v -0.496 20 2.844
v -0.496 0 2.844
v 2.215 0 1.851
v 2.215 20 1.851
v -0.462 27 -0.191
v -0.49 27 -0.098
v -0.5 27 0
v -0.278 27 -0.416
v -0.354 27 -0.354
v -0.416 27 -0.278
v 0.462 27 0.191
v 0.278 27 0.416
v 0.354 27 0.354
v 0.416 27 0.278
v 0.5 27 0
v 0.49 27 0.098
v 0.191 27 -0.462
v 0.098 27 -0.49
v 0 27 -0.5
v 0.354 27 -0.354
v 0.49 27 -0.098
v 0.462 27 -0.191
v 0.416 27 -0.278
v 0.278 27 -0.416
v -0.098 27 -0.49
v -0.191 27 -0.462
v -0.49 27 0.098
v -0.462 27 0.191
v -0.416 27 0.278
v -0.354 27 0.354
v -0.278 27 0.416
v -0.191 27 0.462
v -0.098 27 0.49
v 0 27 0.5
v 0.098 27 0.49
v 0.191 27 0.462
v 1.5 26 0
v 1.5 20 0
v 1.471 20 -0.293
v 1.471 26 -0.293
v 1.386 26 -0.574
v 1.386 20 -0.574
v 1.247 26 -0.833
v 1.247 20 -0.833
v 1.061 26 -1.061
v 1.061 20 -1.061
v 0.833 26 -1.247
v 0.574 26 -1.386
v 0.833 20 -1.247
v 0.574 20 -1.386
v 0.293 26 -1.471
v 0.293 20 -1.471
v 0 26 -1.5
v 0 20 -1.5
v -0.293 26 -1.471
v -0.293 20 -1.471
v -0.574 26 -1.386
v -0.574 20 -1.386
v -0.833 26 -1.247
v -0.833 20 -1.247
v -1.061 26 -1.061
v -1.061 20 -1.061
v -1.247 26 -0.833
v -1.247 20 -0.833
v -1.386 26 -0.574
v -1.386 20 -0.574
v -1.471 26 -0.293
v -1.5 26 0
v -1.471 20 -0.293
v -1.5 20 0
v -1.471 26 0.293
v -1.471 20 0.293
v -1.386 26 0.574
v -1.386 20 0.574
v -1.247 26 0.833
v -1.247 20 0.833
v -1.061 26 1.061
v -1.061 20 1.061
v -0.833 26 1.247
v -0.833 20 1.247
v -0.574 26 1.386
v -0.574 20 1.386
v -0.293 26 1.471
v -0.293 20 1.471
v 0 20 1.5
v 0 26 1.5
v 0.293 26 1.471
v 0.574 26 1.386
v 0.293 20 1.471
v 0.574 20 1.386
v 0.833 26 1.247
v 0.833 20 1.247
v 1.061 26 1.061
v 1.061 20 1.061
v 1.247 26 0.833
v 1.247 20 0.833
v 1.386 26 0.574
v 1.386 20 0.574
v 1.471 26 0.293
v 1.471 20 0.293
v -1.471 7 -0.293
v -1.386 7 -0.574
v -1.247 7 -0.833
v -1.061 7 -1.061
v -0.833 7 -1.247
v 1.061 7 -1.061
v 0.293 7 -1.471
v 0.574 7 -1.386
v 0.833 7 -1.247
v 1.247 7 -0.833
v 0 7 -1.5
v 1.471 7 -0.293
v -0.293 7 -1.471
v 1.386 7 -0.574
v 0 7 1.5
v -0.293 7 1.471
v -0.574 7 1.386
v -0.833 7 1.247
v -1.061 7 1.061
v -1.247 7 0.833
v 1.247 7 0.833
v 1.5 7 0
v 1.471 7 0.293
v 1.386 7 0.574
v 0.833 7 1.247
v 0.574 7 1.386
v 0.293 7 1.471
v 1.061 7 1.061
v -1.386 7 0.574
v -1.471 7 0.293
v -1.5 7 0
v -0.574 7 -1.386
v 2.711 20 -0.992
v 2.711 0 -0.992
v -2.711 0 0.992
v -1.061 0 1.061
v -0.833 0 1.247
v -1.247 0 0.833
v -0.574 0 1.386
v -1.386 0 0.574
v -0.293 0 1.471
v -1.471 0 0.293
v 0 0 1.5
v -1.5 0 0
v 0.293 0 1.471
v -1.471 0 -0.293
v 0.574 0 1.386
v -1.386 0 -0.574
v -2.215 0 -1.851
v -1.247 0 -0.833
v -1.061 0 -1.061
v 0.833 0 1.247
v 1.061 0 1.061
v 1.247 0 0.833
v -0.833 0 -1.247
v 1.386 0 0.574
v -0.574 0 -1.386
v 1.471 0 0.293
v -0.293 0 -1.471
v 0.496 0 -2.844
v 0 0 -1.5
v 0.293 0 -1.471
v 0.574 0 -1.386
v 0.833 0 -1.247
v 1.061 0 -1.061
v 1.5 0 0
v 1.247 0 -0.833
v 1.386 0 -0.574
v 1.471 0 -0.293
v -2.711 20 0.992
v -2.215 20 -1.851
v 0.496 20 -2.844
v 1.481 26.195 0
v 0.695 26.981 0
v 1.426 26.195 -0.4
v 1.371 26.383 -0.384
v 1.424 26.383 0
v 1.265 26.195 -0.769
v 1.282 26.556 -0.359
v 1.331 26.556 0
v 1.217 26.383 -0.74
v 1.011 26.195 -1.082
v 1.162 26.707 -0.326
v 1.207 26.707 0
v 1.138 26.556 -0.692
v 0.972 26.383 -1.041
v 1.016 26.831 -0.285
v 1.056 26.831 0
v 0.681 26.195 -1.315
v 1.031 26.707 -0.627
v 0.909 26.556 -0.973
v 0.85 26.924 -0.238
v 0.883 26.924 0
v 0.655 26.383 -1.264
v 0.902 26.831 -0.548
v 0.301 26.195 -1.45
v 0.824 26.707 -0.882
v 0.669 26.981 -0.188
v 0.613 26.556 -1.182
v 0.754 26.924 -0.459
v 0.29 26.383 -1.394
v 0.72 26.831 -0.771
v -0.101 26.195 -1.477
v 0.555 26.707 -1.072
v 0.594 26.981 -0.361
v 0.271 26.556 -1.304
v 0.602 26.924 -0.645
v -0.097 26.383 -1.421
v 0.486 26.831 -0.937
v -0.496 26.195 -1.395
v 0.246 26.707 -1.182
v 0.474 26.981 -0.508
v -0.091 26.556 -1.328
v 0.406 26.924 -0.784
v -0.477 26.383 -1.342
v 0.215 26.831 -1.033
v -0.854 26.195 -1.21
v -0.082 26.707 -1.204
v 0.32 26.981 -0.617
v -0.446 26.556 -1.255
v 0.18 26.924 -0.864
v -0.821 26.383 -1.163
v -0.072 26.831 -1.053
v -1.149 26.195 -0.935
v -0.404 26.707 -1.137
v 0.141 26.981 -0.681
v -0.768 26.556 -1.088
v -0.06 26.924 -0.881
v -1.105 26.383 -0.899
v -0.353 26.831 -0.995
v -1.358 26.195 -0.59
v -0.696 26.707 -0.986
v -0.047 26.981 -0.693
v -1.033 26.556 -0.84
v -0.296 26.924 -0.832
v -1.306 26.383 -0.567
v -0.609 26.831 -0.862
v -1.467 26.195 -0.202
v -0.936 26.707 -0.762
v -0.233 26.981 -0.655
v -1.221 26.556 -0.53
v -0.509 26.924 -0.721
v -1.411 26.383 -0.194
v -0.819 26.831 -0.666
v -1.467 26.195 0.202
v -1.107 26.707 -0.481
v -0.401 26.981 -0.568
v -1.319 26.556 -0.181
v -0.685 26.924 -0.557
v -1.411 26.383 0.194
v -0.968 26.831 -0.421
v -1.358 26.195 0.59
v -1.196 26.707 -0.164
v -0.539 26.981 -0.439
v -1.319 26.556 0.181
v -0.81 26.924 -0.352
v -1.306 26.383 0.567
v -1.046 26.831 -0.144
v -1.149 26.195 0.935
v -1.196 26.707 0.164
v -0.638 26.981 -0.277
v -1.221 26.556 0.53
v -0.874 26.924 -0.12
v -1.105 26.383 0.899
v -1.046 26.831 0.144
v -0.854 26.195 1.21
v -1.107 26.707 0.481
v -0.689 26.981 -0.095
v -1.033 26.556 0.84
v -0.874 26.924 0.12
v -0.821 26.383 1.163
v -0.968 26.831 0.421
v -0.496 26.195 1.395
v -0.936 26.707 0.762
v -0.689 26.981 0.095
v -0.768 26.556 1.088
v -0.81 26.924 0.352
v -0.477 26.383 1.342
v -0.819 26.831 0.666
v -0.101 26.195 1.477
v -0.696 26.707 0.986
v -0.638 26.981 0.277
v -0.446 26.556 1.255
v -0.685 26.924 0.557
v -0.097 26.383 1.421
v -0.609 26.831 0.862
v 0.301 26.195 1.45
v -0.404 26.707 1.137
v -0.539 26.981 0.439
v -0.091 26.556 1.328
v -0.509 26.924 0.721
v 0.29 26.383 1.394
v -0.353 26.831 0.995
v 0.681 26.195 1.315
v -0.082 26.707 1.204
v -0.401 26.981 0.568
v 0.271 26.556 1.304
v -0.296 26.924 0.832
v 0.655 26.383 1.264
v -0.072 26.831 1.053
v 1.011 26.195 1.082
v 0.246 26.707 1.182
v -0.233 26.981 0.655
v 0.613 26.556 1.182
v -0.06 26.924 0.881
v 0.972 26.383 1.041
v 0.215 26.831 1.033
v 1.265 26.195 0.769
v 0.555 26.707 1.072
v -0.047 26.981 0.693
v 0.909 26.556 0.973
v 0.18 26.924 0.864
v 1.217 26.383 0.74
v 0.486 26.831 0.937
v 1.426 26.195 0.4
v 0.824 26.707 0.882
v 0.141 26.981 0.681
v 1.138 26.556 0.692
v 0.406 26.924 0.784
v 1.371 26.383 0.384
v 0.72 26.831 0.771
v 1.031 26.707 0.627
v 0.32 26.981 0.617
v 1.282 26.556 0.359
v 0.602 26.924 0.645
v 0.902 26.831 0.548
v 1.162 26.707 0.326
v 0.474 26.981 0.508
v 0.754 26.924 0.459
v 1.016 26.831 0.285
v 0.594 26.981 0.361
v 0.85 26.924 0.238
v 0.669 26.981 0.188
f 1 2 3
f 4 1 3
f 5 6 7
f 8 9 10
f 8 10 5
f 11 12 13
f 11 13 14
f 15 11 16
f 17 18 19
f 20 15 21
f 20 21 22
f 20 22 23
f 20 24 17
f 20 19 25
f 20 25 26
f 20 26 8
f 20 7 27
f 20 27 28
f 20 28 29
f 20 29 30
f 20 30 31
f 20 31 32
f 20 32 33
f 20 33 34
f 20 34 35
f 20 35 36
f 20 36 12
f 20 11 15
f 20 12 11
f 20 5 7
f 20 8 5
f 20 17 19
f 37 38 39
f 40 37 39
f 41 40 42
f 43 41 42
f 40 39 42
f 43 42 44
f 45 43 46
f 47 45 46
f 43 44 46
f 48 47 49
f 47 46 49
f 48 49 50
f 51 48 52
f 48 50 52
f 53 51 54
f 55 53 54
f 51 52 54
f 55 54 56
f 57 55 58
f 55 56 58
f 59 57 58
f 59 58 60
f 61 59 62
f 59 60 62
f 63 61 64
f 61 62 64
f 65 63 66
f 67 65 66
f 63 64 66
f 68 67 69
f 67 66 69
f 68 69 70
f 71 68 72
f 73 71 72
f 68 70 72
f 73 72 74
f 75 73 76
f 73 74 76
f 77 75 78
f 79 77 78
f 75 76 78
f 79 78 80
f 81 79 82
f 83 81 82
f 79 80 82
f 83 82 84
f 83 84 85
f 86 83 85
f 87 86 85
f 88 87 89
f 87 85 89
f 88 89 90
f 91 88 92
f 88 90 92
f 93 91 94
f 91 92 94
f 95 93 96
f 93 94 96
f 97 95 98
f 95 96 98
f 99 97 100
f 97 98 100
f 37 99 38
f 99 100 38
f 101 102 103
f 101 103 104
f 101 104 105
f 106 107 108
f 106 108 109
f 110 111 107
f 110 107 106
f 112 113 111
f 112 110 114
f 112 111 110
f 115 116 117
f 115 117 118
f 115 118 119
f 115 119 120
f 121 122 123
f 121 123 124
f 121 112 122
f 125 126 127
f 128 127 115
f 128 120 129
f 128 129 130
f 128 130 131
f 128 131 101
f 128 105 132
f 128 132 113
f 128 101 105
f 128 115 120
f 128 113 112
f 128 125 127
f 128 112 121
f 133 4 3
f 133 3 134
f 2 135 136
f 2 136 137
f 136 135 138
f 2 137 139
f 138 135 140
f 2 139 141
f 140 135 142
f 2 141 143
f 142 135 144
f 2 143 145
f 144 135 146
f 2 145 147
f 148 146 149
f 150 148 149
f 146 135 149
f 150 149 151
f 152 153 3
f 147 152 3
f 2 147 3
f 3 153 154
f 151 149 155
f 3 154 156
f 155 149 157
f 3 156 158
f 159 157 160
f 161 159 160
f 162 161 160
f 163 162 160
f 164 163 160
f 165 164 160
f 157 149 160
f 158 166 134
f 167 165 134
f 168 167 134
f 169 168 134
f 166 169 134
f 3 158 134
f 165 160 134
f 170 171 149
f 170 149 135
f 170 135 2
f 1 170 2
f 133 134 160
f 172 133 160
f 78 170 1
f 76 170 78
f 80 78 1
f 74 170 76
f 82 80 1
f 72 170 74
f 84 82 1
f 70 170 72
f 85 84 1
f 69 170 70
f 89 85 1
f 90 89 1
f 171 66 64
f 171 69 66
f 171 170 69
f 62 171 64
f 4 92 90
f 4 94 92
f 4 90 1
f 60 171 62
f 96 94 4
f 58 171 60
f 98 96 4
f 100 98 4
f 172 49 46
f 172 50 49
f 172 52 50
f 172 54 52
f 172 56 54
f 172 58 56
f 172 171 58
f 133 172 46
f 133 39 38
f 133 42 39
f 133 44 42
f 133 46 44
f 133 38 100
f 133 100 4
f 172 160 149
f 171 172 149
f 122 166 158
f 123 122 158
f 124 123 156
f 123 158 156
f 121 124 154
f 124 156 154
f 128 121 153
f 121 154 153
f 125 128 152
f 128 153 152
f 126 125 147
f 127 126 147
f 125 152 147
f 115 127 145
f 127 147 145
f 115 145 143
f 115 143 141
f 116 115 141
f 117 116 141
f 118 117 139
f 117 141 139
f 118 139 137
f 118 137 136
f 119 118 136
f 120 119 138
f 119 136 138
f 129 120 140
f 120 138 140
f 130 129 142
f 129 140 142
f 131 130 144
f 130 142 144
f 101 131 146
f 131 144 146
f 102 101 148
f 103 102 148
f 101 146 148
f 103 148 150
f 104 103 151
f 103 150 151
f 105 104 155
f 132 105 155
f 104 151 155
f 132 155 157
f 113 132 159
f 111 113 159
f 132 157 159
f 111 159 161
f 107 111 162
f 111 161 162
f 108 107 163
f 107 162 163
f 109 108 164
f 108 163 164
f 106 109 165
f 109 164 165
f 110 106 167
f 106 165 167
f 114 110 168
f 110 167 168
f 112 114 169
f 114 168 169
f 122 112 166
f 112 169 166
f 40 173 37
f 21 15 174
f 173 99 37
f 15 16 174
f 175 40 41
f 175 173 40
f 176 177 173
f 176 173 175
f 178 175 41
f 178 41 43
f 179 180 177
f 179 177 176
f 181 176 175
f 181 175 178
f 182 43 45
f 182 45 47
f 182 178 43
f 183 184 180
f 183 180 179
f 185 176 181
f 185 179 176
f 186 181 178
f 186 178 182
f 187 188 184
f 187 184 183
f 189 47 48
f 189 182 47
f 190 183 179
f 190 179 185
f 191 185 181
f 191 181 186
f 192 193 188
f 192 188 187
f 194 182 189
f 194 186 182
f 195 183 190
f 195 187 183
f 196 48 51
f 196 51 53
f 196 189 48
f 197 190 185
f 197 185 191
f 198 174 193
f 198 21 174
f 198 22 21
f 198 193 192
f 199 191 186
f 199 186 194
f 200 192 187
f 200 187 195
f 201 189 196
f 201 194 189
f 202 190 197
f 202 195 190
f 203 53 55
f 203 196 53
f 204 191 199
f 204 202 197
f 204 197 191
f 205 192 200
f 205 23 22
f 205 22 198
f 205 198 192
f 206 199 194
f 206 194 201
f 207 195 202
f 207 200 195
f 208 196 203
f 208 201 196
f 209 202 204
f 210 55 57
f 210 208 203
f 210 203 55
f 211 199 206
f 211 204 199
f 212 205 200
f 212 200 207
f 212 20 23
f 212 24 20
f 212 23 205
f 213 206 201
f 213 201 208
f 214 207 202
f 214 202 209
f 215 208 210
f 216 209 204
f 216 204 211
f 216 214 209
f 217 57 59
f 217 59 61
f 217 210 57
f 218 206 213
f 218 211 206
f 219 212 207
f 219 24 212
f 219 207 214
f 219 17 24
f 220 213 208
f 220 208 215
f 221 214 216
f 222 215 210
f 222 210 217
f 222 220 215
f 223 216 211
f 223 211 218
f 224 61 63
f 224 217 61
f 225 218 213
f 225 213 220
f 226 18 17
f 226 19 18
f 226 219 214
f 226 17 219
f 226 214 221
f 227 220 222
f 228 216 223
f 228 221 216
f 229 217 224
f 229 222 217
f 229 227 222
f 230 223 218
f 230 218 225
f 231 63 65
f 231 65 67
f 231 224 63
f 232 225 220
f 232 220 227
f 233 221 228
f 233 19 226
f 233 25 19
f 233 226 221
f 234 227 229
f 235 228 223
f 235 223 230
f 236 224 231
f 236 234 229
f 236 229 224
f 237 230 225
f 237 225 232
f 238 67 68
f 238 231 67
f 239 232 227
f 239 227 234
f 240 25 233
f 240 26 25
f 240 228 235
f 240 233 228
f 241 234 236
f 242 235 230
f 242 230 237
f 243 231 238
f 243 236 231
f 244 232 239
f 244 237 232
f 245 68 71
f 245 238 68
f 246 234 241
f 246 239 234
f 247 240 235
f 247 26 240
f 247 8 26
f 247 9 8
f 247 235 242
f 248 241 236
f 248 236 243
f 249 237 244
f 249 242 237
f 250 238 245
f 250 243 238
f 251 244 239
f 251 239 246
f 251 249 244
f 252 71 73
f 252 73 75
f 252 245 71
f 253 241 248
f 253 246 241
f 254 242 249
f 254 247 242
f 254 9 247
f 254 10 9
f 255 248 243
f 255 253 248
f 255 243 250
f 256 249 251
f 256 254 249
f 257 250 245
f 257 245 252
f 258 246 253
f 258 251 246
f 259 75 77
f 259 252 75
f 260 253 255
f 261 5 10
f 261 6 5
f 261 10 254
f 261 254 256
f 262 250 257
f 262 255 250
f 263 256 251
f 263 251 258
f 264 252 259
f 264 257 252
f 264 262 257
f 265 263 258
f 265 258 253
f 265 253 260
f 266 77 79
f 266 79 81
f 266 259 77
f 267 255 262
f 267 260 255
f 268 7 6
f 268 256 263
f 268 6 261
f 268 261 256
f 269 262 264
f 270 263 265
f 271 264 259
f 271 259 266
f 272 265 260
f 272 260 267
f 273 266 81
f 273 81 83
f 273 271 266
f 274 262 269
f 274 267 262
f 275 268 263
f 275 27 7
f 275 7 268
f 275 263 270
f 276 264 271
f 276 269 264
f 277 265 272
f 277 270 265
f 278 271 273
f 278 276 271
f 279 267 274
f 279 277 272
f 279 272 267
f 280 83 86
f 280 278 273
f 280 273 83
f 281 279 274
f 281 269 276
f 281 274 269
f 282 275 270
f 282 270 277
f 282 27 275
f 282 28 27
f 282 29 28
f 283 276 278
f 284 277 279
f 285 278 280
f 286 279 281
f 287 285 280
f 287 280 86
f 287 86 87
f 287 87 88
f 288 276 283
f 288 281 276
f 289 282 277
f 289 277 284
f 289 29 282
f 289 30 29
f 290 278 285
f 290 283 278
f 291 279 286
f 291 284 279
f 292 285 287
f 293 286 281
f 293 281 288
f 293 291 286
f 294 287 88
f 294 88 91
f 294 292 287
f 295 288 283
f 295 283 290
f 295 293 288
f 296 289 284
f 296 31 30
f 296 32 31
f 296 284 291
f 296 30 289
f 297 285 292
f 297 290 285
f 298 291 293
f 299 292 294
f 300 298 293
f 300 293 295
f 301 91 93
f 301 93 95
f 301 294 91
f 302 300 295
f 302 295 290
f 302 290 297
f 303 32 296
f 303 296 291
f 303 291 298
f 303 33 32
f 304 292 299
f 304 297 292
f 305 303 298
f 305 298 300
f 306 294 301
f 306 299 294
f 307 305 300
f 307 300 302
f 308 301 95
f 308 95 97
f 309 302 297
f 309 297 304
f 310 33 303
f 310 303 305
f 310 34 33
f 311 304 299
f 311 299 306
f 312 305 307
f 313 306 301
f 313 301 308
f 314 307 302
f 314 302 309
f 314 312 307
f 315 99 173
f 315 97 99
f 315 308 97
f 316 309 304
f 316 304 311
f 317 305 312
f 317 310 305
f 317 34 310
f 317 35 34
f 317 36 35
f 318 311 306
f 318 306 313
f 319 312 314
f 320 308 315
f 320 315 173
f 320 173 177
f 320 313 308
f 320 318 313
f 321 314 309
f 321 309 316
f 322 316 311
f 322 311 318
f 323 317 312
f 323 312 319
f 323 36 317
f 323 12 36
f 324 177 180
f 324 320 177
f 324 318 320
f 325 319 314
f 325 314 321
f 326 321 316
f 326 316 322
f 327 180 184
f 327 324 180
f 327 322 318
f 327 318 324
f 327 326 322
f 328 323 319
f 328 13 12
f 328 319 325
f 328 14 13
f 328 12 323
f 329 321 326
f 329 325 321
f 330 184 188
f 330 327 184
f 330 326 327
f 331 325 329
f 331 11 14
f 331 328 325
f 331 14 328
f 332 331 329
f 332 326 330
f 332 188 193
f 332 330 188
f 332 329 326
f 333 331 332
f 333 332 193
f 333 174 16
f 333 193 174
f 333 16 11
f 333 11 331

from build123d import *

# Parameters (mm, degrees)
BOSS_EXTRUDE1_DEPTH = 20
SKETCH2_R           = 1.5
BOSS_EXTRUDE2_DEPTH = 7
SKETCH3_R           = 1.5
CUT_EXTRUDE1_DEPTH  = 7
FILLET1_R           = 1


with BuildPart() as part:
    # Sketch1 → Boss-Extrude1 (new body)
    with BuildSketch(Plane(origin=(0, 0, 0), x_dir=(1, 0, 0), z_dir=(0, 1, 0))):
        Polygon((2.214824591, -1.851454932), (2.7108193, 0.992366895), (0.495994709, 2.843821827), (-2.214824591, 1.851454932), (-2.7108193, -0.992366895), (-0.495994709, -2.843821827), align=None)
    extrude(amount=BOSS_EXTRUDE1_DEPTH)

    # Sketch2 → Boss-Extrude2 (add)
    with BuildSketch(Plane(origin=(0, 20, 0), x_dir=(1, 0, 0), z_dir=(0, 1, 0))):
        Circle(SKETCH2_R)
    extrude(amount=BOSS_EXTRUDE2_DEPTH)

    # Sketch3 → Cut-Extrude1 (cut)
    with BuildSketch(Plane.XZ):
        Circle(SKETCH3_R)
    extrude(amount=-CUT_EXTRUDE1_DEPTH, mode=Mode.SUBTRACT)

    # Fillet1
    fillet1_edges = [part.edges().sort_by_distance(p)[0] for p in [
        (-1.5, 27, 0),
    ]]
    fillet(fillet1_edges, radius=FILLET1_R)


solid = part.part
